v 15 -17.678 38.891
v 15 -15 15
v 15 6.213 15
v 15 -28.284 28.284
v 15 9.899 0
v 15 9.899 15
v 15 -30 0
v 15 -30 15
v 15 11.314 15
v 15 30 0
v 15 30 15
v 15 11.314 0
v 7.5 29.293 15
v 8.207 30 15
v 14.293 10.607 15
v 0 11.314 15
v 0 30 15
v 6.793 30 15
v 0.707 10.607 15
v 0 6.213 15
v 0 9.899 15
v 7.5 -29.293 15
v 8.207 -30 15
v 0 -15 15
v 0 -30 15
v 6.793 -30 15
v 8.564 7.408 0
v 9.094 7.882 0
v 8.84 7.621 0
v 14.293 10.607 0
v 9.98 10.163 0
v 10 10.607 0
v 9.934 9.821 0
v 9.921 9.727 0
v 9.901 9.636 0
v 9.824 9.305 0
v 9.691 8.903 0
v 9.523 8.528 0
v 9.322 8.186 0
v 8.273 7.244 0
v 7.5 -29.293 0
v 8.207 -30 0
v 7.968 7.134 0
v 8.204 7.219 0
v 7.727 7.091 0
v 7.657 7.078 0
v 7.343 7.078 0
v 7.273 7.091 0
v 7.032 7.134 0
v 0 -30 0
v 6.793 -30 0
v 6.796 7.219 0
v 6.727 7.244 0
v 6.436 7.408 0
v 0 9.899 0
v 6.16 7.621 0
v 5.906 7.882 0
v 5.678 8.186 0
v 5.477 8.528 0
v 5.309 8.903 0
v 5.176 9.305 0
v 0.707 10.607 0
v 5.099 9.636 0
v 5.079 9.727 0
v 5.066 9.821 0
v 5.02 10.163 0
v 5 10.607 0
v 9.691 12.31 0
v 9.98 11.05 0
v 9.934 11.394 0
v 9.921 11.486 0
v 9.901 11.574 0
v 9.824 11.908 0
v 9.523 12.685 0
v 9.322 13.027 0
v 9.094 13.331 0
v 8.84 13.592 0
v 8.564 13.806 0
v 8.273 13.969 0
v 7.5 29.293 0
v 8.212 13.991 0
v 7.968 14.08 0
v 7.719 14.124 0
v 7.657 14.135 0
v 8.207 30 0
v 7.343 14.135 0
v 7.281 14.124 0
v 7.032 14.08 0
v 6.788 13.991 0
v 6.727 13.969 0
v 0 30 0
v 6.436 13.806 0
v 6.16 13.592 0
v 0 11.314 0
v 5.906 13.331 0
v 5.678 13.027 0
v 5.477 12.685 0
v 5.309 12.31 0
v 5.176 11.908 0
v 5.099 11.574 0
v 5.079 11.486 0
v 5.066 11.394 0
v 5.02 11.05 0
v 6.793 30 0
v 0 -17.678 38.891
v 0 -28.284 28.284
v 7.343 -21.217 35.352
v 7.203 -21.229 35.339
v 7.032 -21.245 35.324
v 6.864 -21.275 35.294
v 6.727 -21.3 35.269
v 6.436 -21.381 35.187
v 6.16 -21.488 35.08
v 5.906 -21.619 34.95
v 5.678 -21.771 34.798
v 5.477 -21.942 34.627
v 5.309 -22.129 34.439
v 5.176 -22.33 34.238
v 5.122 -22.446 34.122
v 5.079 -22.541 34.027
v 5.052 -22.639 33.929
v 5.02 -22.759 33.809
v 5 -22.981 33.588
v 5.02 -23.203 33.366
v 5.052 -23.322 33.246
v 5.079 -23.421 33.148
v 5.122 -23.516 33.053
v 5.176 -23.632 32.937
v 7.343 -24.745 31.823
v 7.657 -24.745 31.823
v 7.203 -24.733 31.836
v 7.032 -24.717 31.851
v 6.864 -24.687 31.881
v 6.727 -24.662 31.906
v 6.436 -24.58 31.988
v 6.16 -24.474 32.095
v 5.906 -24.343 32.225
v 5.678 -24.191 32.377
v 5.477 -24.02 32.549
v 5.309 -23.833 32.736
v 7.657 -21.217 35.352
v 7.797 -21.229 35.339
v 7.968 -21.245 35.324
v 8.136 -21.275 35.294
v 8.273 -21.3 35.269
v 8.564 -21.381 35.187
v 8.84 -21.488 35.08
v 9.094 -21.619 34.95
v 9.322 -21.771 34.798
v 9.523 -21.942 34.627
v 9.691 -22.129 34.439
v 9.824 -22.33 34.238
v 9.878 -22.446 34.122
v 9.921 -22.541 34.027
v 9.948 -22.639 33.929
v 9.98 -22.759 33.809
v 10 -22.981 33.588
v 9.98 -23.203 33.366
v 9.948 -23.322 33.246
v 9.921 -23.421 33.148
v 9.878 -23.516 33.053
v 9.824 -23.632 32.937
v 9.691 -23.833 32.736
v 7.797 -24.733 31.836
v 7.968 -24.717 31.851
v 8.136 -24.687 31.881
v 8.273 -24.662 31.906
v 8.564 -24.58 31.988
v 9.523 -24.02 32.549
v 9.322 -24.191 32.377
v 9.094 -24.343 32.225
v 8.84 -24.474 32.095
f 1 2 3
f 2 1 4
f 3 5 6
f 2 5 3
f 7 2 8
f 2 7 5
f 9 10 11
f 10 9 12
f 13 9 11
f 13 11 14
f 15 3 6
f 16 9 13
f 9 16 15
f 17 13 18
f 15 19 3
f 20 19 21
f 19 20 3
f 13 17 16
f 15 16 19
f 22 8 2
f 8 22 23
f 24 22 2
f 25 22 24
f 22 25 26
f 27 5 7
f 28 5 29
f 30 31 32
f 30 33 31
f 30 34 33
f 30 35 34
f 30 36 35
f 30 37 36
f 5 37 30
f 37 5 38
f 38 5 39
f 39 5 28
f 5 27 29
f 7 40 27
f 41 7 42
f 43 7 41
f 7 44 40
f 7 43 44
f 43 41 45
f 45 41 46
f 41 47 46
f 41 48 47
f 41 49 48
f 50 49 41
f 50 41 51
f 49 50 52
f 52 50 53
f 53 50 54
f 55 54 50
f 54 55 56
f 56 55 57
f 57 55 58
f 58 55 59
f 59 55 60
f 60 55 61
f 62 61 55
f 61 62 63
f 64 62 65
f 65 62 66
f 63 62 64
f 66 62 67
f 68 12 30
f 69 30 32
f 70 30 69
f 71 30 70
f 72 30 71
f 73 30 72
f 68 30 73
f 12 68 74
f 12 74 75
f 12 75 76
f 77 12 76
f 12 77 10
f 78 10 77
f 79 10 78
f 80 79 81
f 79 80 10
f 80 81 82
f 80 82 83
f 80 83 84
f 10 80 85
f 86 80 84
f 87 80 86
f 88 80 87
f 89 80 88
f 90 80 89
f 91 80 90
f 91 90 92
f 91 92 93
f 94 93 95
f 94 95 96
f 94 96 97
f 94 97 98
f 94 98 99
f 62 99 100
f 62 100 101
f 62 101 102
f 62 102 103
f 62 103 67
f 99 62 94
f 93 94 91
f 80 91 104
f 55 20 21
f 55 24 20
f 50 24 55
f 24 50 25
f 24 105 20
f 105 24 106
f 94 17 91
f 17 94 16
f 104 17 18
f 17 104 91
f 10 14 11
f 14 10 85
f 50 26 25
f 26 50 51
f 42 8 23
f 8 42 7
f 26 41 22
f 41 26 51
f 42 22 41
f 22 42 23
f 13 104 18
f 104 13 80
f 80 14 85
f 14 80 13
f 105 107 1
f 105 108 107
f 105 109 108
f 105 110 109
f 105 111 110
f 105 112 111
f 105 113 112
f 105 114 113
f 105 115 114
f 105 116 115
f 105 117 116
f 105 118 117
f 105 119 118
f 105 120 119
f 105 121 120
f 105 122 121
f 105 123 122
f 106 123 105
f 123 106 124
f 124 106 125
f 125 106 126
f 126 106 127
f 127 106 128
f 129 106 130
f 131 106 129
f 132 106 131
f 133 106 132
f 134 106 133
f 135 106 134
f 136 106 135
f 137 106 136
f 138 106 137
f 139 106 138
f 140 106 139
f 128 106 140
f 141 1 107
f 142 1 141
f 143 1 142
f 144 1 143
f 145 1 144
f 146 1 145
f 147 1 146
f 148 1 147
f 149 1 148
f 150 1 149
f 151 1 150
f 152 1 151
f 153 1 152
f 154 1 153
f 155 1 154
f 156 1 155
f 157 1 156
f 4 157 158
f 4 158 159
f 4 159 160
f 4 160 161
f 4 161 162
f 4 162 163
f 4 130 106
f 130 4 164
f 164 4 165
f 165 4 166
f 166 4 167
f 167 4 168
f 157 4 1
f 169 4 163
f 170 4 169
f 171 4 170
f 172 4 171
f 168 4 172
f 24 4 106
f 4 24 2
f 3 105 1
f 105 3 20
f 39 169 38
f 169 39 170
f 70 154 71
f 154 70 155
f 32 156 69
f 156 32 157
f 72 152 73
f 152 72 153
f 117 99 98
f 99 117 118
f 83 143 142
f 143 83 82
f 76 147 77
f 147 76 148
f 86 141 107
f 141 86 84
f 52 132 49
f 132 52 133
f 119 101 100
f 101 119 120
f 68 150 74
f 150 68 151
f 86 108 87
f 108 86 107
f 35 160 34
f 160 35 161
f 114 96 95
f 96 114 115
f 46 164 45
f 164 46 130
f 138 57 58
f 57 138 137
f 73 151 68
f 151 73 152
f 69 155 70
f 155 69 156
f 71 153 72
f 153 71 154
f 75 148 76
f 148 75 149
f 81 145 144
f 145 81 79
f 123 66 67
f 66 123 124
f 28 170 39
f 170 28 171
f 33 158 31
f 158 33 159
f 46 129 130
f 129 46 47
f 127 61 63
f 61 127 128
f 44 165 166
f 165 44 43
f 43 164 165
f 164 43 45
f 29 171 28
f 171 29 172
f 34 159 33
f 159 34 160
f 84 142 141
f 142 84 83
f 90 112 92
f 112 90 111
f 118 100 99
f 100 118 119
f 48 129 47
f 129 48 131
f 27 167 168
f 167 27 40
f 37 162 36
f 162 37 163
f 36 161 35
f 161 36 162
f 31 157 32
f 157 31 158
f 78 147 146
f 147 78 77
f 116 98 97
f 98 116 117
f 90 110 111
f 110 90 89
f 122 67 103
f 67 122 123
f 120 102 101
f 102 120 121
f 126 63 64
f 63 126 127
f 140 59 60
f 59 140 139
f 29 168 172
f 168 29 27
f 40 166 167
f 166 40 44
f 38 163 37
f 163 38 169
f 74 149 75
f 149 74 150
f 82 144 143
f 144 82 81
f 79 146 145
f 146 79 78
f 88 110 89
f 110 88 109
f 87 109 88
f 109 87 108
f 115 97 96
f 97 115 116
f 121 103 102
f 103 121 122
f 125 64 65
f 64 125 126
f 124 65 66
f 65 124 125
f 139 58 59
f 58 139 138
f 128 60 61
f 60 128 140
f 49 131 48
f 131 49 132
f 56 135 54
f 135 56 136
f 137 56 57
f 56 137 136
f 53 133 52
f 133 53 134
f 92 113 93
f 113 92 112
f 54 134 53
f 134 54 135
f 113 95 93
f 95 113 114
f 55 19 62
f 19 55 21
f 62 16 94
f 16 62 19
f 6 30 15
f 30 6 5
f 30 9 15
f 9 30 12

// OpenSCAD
bit_angle = 45; // [10:90]
bit_diameter = 5; // [1.0:14.0]
module holder(diameter, angle){
	$fn=50;
	module notch(){
		rotate([0,0,45])
		translate([-.5,-.5,-200])
		cube([1,1,500]);
	}
	difference(){
		difference(){
			union(){
				difference(){
					translate([0,-30,0])
					cube([15,60,15]);
					translate([7.5,-30,0])
					notch();
					translate([7.5,30,0])
					notch();	
				}
				rotate([90-angle,0,0])
				cube([15,15,40]);
			}
			rotate([90-angle,0,0])
			translate([7.5,7.5,-50])
			cylinder(h=200,r=diameter/2);
		}
		translate([0,7.5/cos(90-angle),0])
		notch();
		translate([15,7.5/cos(90-angle),0])
		notch();
	}
}
holder(bit_diameter,bit_angle);
